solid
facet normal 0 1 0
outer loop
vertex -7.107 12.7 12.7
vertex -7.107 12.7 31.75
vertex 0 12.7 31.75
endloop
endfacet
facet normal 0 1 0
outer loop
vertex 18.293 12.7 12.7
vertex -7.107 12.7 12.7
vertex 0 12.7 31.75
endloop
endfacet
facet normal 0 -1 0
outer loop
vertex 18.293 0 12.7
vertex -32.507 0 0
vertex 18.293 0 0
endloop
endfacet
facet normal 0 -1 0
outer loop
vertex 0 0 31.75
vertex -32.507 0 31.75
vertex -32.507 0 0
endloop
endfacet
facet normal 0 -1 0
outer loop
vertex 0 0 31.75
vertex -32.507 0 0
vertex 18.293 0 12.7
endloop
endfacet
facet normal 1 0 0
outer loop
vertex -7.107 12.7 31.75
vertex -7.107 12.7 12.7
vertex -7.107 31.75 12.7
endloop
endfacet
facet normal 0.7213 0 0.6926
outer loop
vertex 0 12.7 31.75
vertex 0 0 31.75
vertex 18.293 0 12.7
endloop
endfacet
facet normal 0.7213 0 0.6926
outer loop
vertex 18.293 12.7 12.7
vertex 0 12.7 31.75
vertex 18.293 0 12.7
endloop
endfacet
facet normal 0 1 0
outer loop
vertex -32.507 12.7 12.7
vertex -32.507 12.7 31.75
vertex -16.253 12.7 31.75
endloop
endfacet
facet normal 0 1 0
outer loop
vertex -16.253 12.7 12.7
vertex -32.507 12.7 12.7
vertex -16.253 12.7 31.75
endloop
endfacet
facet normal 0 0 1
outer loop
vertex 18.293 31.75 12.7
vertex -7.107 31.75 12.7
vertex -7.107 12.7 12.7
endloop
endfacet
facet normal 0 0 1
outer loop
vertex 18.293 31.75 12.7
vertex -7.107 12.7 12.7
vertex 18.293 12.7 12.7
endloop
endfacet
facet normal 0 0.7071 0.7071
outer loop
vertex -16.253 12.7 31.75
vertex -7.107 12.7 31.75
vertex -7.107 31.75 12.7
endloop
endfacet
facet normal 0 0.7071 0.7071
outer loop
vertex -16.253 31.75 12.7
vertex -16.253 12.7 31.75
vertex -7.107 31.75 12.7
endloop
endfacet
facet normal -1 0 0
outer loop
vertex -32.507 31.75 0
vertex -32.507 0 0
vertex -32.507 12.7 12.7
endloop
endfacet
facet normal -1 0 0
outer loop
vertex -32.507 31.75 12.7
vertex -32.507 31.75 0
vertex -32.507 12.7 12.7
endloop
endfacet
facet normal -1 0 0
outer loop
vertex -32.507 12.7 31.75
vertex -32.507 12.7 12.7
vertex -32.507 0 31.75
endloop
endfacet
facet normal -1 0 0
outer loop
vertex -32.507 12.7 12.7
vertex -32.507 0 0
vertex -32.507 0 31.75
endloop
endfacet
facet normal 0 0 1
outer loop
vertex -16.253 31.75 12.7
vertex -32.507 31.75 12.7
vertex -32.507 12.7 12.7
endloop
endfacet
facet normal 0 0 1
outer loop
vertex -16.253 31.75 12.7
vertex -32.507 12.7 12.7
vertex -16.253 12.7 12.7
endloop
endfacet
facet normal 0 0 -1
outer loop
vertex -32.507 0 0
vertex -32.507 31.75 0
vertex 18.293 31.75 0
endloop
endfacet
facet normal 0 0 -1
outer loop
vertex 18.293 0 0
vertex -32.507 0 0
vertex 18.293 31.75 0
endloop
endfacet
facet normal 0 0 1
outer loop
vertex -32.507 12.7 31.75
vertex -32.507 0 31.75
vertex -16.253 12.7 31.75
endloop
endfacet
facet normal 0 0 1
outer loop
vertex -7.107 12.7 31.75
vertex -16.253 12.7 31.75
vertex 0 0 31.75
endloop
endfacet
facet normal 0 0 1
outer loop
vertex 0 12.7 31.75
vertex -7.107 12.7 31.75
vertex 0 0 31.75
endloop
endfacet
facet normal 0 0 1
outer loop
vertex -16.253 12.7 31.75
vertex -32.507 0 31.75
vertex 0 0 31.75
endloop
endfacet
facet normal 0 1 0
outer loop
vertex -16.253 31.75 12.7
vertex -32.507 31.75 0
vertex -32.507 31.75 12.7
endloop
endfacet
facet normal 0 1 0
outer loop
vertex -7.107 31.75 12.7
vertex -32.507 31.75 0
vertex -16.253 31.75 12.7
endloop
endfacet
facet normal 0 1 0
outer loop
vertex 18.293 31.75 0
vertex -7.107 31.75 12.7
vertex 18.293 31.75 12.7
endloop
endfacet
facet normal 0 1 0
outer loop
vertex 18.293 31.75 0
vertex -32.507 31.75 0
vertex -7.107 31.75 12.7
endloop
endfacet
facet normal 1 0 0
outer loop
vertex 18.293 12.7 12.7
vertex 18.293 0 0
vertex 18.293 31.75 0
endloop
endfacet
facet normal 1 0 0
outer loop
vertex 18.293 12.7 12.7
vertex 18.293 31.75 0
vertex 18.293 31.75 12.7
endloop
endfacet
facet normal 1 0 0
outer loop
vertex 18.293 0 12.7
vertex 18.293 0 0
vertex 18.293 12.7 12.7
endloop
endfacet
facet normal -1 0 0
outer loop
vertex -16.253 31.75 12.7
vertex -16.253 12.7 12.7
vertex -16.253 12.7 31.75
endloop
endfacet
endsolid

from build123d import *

# Parameters (mm, degrees)
F0_W     = 50.8
F0_H     = 31.75
F1_DEPTH = 12.7
F2_W     = 50.8
F2_H     = 19.05
F3_DEPTH = 12.7
F5_DEPTH = 25.4
F6_W     = 9.14671
F6_H     = 19.05
F7_DEPTH = 19.05
F9_DEPTH = 25.4


with BuildPart() as f1:
    # F0 (on Top) → F1 (new body)
    with BuildSketch(Plane.XY):
        with Locations((-7.10658, 15.875)):
            Rectangle(F0_W, F0_H)
    extrude(amount=F1_DEPTH)

    # F2 (on face) → F3 (join)
    with BuildSketch(Plane.XZ):
        with Locations((-7.10658, 22.225)):
            Rectangle(F2_W, F2_H)
    extrude(amount=-F3_DEPTH)

    # F4 (on face) → F5 (cut)
    with BuildSketch(Plane.XZ):
        Polygon((18.29342, 31.75), (0, 31.75), (18.29342, 12.7), align=None)
    extrude(amount=-F5_DEPTH, mode=Mode.SUBTRACT)

    # F6 (on face) → F7 (join)
    with BuildSketch(Plane(origin=(0, 12.7, 0), x_dir=(-1, 0, 0), z_dir=(0, 1, 0))):
        with Locations((11.679935, 22.225)):
            Rectangle(F6_W, F6_H)
    extrude(amount=F7_DEPTH)

    # F8 (on face) → F9 (cut)
    with BuildSketch(Plane.YZ.offset(-7.10658)):
        Polygon((31.75, 31.75), (12.7, 31.75), (31.75, 12.7), align=None)
    extrude(amount=-F9_DEPTH, mode=Mode.SUBTRACT)


solid = f1.part
